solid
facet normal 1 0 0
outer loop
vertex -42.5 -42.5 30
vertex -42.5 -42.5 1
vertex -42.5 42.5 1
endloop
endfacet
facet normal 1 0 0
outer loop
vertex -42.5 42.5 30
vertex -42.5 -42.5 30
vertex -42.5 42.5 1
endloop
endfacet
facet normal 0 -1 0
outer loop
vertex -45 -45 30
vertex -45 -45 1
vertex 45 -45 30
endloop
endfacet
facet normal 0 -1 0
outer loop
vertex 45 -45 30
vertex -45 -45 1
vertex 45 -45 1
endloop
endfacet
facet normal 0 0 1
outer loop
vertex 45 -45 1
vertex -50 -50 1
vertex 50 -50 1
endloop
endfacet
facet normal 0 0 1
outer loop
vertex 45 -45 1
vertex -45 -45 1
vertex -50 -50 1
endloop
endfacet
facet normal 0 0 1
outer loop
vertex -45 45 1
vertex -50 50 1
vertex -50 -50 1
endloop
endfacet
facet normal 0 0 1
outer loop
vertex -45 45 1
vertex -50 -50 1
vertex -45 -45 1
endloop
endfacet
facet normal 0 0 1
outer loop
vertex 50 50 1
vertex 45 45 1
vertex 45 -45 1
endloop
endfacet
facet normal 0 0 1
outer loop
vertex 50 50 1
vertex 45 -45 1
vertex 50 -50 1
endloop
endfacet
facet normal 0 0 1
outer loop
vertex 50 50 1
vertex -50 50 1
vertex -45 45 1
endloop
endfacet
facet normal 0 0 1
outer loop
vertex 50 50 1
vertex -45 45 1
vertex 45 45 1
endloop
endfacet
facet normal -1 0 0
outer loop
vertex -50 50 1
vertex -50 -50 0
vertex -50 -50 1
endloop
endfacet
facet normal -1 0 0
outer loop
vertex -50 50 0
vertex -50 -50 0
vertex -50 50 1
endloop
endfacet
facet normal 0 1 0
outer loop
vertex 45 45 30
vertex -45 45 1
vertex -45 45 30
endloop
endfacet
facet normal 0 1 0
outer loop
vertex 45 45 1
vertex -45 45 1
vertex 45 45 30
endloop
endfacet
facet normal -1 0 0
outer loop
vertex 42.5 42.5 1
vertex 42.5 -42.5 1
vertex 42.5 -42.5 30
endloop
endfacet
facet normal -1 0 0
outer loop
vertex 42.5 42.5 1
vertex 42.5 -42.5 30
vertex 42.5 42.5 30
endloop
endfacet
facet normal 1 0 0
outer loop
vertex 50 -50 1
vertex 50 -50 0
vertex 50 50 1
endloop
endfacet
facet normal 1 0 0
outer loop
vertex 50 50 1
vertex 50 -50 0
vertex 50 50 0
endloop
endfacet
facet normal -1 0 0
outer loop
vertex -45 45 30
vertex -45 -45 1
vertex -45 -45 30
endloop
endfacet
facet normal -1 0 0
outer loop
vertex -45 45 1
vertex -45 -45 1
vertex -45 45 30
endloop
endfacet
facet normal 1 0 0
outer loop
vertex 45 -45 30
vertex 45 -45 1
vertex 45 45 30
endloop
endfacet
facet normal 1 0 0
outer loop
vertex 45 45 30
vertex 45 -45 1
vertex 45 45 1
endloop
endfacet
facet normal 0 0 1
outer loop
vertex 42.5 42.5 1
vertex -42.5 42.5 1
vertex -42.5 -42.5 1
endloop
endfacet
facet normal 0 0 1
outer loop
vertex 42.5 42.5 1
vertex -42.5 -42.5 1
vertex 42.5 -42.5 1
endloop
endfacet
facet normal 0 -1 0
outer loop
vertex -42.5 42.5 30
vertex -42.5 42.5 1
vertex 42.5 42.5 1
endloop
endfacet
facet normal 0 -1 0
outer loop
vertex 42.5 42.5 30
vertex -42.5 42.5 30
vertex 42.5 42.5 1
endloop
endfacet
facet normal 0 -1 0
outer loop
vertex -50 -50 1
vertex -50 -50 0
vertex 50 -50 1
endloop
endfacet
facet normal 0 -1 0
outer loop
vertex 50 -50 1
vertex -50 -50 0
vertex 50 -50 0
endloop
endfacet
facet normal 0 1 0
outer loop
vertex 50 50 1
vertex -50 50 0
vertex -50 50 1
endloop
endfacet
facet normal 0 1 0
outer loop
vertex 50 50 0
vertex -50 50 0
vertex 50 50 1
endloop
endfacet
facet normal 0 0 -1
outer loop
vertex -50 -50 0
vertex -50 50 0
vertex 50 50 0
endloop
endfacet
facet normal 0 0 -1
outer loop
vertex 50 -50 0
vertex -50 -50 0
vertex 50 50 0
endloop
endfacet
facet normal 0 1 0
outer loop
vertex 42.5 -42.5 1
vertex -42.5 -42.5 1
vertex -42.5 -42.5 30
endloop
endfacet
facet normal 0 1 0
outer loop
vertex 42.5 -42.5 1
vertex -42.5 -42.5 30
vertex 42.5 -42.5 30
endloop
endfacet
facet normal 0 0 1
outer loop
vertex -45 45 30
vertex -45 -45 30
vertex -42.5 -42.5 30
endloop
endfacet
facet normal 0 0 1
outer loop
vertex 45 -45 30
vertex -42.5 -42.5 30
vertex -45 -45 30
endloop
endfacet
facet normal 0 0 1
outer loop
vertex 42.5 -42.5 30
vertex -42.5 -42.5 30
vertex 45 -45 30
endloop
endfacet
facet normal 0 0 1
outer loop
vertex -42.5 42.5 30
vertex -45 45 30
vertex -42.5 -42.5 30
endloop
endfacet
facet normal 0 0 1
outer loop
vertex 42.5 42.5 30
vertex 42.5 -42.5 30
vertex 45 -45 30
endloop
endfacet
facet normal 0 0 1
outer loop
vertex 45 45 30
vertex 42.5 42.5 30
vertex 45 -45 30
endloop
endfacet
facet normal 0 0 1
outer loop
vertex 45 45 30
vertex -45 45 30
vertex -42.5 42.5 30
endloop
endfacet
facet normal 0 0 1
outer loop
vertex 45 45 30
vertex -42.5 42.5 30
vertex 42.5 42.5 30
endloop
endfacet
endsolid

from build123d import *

# Parameters (mm, degrees)
F0_W     = 90
F0_H     = 90
F0_W_2   = 85
F0_H_2   = 85
F1_DEPTH = 30
F0_W_3   = 100
F0_H_3   = 100
F2_DEPTH = 1


with BuildPart() as f1:
    # F0 (on Top) → F1 (new body)
    with BuildSketch(Plane.XY):
        Rectangle(F0_W, F0_H)
        Rectangle(F0_W_2, F0_H_2, mode=Mode.SUBTRACT)
    extrude(amount=F1_DEPTH)

    # F0 (on Top) → F2 (join)
    with BuildSketch(Plane.XY):
        Rectangle(F0_W_3, F0_H_3)
        Rectangle(F0_W, F0_H, mode=Mode.SUBTRACT)
        Rectangle(F0_W_2, F0_H_2)
    extrude(amount=F2_DEPTH)


solid = f1.part
